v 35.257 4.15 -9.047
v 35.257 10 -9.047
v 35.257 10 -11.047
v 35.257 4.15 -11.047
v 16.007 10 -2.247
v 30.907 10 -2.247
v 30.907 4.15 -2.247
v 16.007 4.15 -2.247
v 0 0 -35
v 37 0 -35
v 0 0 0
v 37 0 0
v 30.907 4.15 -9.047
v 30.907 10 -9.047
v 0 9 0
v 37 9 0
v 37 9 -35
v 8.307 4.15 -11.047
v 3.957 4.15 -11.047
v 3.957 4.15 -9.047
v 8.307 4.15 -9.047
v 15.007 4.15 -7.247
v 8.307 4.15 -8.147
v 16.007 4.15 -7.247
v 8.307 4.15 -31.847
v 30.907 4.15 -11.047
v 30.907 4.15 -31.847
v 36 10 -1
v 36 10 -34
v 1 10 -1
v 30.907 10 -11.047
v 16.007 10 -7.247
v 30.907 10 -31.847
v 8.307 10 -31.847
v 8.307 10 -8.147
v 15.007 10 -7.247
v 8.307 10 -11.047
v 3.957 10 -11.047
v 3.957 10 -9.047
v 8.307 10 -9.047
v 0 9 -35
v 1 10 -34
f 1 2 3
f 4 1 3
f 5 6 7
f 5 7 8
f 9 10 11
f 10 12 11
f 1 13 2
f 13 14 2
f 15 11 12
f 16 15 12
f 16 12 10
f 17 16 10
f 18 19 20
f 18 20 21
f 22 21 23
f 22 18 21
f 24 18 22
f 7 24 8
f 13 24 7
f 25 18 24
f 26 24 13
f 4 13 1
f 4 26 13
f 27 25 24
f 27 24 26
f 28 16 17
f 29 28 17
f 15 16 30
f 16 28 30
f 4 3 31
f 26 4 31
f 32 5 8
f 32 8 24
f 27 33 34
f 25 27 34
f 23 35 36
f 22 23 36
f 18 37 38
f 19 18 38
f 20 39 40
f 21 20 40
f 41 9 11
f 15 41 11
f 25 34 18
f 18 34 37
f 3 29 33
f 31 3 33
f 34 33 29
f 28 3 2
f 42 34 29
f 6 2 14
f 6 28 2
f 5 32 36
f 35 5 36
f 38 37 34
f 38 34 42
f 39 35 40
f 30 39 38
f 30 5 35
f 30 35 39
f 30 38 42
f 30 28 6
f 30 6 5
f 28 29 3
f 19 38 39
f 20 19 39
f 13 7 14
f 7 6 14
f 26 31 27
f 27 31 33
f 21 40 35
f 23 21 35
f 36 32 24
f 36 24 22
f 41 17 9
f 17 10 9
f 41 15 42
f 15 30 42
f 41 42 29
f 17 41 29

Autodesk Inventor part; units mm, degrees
ref_plane "YZ Plane" through (0, 0, 0) normal (1, 0, 0) x (0, 1, 0)
ref_plane "XZ Plane" through (0, 0, 0) normal (0, 1, 0) x (-1, 0, 0)
ref_plane "XY Plane" through (0, 0, 0) normal (0, 0, 1) x (1, 0, 0)
sketch "Sketch2" plane through (0, 0, 0) normal (0, 1, 0) x (-1, 0, 0)
  line L0 (0, 0) -> (-37, 0)
  line L1 (-37, 0) -> (-37, -35)
  line L2 (-37, -35) -> (0, -35)
  line L3 (0, -35) -> (0, 0)
  dimension "d4" = 37
  dimension "d5" = 35
extrude "Extrusion2" add sketch "Sketch2" along normal blind 10
sketch "Sketch3" plane through (0, 10, 0) normal (0, 1, 0) x (1, 0, 0)
  point P0 (0, 0)
sketch "Sketch4" plane through (0, 10, 0) normal (0, 1, 0) x (1, 0, 0)
  line L0 (30.9066, 2.247) -> (16.0066, 2.247)
  line L1 (16.0066, 2.247) -> (16.0066, 7.247)
  line L2 (16.0066, 7.247) -> (15.0066, 7.247)
  line L3 (30.9066, 2.247) -> (30.9066, 9.047)
  line L4 (30.9066, 9.047) -> (35.2566, 9.047)
  line L5 (35.2566, 9.047) -> (35.2566, 11.047)
  line L6 (35.2566, 11.047) -> (30.9066, 11.047)
  line L7 (30.9066, 11.047) -> (30.9066, 31.847)
  line L8 (30.9066, 31.847) -> (8.3066, 31.847)
  line L9 (8.3066, 31.847) -> (8.3066, 11.047)
  line L10 (8.3066, 11.047) -> (3.9566, 11.047)
  line L11 (3.9566, 11.047) -> (3.9566, 9.047)
  line L12 (3.9566, 9.047) -> (8.3066, 9.047)
  line L13 (8.3066, 9.047) -> (8.3066, 8.147)
  line L14 (8.3066, 8.147) -> (15.0066, 7.247)
  point P0 (0, 0)
  dimension "d8" = 14.9
  dimension "d9" = 5
  dimension "d10" = 1
  dimension "d11" = 6.8
  dimension "d12" = 4.35
  dimension "d13" = 2
  dimension "d14" = 20.8
  dimension "d15" = 22.6
  dimension "d16" = 4.35
  dimension "d17" = 0.9
extrude "Extrusion3" cut sketch "Sketch4" against normal blind 5.85
chamfer "Chamfer1" distance 1 angle 45 4 edges at (37, 10, -17.5) (18.5, 10, -35) (0, 10, -17.5) (18.5, 10, 0)
properties part number "servo_sandbox"
